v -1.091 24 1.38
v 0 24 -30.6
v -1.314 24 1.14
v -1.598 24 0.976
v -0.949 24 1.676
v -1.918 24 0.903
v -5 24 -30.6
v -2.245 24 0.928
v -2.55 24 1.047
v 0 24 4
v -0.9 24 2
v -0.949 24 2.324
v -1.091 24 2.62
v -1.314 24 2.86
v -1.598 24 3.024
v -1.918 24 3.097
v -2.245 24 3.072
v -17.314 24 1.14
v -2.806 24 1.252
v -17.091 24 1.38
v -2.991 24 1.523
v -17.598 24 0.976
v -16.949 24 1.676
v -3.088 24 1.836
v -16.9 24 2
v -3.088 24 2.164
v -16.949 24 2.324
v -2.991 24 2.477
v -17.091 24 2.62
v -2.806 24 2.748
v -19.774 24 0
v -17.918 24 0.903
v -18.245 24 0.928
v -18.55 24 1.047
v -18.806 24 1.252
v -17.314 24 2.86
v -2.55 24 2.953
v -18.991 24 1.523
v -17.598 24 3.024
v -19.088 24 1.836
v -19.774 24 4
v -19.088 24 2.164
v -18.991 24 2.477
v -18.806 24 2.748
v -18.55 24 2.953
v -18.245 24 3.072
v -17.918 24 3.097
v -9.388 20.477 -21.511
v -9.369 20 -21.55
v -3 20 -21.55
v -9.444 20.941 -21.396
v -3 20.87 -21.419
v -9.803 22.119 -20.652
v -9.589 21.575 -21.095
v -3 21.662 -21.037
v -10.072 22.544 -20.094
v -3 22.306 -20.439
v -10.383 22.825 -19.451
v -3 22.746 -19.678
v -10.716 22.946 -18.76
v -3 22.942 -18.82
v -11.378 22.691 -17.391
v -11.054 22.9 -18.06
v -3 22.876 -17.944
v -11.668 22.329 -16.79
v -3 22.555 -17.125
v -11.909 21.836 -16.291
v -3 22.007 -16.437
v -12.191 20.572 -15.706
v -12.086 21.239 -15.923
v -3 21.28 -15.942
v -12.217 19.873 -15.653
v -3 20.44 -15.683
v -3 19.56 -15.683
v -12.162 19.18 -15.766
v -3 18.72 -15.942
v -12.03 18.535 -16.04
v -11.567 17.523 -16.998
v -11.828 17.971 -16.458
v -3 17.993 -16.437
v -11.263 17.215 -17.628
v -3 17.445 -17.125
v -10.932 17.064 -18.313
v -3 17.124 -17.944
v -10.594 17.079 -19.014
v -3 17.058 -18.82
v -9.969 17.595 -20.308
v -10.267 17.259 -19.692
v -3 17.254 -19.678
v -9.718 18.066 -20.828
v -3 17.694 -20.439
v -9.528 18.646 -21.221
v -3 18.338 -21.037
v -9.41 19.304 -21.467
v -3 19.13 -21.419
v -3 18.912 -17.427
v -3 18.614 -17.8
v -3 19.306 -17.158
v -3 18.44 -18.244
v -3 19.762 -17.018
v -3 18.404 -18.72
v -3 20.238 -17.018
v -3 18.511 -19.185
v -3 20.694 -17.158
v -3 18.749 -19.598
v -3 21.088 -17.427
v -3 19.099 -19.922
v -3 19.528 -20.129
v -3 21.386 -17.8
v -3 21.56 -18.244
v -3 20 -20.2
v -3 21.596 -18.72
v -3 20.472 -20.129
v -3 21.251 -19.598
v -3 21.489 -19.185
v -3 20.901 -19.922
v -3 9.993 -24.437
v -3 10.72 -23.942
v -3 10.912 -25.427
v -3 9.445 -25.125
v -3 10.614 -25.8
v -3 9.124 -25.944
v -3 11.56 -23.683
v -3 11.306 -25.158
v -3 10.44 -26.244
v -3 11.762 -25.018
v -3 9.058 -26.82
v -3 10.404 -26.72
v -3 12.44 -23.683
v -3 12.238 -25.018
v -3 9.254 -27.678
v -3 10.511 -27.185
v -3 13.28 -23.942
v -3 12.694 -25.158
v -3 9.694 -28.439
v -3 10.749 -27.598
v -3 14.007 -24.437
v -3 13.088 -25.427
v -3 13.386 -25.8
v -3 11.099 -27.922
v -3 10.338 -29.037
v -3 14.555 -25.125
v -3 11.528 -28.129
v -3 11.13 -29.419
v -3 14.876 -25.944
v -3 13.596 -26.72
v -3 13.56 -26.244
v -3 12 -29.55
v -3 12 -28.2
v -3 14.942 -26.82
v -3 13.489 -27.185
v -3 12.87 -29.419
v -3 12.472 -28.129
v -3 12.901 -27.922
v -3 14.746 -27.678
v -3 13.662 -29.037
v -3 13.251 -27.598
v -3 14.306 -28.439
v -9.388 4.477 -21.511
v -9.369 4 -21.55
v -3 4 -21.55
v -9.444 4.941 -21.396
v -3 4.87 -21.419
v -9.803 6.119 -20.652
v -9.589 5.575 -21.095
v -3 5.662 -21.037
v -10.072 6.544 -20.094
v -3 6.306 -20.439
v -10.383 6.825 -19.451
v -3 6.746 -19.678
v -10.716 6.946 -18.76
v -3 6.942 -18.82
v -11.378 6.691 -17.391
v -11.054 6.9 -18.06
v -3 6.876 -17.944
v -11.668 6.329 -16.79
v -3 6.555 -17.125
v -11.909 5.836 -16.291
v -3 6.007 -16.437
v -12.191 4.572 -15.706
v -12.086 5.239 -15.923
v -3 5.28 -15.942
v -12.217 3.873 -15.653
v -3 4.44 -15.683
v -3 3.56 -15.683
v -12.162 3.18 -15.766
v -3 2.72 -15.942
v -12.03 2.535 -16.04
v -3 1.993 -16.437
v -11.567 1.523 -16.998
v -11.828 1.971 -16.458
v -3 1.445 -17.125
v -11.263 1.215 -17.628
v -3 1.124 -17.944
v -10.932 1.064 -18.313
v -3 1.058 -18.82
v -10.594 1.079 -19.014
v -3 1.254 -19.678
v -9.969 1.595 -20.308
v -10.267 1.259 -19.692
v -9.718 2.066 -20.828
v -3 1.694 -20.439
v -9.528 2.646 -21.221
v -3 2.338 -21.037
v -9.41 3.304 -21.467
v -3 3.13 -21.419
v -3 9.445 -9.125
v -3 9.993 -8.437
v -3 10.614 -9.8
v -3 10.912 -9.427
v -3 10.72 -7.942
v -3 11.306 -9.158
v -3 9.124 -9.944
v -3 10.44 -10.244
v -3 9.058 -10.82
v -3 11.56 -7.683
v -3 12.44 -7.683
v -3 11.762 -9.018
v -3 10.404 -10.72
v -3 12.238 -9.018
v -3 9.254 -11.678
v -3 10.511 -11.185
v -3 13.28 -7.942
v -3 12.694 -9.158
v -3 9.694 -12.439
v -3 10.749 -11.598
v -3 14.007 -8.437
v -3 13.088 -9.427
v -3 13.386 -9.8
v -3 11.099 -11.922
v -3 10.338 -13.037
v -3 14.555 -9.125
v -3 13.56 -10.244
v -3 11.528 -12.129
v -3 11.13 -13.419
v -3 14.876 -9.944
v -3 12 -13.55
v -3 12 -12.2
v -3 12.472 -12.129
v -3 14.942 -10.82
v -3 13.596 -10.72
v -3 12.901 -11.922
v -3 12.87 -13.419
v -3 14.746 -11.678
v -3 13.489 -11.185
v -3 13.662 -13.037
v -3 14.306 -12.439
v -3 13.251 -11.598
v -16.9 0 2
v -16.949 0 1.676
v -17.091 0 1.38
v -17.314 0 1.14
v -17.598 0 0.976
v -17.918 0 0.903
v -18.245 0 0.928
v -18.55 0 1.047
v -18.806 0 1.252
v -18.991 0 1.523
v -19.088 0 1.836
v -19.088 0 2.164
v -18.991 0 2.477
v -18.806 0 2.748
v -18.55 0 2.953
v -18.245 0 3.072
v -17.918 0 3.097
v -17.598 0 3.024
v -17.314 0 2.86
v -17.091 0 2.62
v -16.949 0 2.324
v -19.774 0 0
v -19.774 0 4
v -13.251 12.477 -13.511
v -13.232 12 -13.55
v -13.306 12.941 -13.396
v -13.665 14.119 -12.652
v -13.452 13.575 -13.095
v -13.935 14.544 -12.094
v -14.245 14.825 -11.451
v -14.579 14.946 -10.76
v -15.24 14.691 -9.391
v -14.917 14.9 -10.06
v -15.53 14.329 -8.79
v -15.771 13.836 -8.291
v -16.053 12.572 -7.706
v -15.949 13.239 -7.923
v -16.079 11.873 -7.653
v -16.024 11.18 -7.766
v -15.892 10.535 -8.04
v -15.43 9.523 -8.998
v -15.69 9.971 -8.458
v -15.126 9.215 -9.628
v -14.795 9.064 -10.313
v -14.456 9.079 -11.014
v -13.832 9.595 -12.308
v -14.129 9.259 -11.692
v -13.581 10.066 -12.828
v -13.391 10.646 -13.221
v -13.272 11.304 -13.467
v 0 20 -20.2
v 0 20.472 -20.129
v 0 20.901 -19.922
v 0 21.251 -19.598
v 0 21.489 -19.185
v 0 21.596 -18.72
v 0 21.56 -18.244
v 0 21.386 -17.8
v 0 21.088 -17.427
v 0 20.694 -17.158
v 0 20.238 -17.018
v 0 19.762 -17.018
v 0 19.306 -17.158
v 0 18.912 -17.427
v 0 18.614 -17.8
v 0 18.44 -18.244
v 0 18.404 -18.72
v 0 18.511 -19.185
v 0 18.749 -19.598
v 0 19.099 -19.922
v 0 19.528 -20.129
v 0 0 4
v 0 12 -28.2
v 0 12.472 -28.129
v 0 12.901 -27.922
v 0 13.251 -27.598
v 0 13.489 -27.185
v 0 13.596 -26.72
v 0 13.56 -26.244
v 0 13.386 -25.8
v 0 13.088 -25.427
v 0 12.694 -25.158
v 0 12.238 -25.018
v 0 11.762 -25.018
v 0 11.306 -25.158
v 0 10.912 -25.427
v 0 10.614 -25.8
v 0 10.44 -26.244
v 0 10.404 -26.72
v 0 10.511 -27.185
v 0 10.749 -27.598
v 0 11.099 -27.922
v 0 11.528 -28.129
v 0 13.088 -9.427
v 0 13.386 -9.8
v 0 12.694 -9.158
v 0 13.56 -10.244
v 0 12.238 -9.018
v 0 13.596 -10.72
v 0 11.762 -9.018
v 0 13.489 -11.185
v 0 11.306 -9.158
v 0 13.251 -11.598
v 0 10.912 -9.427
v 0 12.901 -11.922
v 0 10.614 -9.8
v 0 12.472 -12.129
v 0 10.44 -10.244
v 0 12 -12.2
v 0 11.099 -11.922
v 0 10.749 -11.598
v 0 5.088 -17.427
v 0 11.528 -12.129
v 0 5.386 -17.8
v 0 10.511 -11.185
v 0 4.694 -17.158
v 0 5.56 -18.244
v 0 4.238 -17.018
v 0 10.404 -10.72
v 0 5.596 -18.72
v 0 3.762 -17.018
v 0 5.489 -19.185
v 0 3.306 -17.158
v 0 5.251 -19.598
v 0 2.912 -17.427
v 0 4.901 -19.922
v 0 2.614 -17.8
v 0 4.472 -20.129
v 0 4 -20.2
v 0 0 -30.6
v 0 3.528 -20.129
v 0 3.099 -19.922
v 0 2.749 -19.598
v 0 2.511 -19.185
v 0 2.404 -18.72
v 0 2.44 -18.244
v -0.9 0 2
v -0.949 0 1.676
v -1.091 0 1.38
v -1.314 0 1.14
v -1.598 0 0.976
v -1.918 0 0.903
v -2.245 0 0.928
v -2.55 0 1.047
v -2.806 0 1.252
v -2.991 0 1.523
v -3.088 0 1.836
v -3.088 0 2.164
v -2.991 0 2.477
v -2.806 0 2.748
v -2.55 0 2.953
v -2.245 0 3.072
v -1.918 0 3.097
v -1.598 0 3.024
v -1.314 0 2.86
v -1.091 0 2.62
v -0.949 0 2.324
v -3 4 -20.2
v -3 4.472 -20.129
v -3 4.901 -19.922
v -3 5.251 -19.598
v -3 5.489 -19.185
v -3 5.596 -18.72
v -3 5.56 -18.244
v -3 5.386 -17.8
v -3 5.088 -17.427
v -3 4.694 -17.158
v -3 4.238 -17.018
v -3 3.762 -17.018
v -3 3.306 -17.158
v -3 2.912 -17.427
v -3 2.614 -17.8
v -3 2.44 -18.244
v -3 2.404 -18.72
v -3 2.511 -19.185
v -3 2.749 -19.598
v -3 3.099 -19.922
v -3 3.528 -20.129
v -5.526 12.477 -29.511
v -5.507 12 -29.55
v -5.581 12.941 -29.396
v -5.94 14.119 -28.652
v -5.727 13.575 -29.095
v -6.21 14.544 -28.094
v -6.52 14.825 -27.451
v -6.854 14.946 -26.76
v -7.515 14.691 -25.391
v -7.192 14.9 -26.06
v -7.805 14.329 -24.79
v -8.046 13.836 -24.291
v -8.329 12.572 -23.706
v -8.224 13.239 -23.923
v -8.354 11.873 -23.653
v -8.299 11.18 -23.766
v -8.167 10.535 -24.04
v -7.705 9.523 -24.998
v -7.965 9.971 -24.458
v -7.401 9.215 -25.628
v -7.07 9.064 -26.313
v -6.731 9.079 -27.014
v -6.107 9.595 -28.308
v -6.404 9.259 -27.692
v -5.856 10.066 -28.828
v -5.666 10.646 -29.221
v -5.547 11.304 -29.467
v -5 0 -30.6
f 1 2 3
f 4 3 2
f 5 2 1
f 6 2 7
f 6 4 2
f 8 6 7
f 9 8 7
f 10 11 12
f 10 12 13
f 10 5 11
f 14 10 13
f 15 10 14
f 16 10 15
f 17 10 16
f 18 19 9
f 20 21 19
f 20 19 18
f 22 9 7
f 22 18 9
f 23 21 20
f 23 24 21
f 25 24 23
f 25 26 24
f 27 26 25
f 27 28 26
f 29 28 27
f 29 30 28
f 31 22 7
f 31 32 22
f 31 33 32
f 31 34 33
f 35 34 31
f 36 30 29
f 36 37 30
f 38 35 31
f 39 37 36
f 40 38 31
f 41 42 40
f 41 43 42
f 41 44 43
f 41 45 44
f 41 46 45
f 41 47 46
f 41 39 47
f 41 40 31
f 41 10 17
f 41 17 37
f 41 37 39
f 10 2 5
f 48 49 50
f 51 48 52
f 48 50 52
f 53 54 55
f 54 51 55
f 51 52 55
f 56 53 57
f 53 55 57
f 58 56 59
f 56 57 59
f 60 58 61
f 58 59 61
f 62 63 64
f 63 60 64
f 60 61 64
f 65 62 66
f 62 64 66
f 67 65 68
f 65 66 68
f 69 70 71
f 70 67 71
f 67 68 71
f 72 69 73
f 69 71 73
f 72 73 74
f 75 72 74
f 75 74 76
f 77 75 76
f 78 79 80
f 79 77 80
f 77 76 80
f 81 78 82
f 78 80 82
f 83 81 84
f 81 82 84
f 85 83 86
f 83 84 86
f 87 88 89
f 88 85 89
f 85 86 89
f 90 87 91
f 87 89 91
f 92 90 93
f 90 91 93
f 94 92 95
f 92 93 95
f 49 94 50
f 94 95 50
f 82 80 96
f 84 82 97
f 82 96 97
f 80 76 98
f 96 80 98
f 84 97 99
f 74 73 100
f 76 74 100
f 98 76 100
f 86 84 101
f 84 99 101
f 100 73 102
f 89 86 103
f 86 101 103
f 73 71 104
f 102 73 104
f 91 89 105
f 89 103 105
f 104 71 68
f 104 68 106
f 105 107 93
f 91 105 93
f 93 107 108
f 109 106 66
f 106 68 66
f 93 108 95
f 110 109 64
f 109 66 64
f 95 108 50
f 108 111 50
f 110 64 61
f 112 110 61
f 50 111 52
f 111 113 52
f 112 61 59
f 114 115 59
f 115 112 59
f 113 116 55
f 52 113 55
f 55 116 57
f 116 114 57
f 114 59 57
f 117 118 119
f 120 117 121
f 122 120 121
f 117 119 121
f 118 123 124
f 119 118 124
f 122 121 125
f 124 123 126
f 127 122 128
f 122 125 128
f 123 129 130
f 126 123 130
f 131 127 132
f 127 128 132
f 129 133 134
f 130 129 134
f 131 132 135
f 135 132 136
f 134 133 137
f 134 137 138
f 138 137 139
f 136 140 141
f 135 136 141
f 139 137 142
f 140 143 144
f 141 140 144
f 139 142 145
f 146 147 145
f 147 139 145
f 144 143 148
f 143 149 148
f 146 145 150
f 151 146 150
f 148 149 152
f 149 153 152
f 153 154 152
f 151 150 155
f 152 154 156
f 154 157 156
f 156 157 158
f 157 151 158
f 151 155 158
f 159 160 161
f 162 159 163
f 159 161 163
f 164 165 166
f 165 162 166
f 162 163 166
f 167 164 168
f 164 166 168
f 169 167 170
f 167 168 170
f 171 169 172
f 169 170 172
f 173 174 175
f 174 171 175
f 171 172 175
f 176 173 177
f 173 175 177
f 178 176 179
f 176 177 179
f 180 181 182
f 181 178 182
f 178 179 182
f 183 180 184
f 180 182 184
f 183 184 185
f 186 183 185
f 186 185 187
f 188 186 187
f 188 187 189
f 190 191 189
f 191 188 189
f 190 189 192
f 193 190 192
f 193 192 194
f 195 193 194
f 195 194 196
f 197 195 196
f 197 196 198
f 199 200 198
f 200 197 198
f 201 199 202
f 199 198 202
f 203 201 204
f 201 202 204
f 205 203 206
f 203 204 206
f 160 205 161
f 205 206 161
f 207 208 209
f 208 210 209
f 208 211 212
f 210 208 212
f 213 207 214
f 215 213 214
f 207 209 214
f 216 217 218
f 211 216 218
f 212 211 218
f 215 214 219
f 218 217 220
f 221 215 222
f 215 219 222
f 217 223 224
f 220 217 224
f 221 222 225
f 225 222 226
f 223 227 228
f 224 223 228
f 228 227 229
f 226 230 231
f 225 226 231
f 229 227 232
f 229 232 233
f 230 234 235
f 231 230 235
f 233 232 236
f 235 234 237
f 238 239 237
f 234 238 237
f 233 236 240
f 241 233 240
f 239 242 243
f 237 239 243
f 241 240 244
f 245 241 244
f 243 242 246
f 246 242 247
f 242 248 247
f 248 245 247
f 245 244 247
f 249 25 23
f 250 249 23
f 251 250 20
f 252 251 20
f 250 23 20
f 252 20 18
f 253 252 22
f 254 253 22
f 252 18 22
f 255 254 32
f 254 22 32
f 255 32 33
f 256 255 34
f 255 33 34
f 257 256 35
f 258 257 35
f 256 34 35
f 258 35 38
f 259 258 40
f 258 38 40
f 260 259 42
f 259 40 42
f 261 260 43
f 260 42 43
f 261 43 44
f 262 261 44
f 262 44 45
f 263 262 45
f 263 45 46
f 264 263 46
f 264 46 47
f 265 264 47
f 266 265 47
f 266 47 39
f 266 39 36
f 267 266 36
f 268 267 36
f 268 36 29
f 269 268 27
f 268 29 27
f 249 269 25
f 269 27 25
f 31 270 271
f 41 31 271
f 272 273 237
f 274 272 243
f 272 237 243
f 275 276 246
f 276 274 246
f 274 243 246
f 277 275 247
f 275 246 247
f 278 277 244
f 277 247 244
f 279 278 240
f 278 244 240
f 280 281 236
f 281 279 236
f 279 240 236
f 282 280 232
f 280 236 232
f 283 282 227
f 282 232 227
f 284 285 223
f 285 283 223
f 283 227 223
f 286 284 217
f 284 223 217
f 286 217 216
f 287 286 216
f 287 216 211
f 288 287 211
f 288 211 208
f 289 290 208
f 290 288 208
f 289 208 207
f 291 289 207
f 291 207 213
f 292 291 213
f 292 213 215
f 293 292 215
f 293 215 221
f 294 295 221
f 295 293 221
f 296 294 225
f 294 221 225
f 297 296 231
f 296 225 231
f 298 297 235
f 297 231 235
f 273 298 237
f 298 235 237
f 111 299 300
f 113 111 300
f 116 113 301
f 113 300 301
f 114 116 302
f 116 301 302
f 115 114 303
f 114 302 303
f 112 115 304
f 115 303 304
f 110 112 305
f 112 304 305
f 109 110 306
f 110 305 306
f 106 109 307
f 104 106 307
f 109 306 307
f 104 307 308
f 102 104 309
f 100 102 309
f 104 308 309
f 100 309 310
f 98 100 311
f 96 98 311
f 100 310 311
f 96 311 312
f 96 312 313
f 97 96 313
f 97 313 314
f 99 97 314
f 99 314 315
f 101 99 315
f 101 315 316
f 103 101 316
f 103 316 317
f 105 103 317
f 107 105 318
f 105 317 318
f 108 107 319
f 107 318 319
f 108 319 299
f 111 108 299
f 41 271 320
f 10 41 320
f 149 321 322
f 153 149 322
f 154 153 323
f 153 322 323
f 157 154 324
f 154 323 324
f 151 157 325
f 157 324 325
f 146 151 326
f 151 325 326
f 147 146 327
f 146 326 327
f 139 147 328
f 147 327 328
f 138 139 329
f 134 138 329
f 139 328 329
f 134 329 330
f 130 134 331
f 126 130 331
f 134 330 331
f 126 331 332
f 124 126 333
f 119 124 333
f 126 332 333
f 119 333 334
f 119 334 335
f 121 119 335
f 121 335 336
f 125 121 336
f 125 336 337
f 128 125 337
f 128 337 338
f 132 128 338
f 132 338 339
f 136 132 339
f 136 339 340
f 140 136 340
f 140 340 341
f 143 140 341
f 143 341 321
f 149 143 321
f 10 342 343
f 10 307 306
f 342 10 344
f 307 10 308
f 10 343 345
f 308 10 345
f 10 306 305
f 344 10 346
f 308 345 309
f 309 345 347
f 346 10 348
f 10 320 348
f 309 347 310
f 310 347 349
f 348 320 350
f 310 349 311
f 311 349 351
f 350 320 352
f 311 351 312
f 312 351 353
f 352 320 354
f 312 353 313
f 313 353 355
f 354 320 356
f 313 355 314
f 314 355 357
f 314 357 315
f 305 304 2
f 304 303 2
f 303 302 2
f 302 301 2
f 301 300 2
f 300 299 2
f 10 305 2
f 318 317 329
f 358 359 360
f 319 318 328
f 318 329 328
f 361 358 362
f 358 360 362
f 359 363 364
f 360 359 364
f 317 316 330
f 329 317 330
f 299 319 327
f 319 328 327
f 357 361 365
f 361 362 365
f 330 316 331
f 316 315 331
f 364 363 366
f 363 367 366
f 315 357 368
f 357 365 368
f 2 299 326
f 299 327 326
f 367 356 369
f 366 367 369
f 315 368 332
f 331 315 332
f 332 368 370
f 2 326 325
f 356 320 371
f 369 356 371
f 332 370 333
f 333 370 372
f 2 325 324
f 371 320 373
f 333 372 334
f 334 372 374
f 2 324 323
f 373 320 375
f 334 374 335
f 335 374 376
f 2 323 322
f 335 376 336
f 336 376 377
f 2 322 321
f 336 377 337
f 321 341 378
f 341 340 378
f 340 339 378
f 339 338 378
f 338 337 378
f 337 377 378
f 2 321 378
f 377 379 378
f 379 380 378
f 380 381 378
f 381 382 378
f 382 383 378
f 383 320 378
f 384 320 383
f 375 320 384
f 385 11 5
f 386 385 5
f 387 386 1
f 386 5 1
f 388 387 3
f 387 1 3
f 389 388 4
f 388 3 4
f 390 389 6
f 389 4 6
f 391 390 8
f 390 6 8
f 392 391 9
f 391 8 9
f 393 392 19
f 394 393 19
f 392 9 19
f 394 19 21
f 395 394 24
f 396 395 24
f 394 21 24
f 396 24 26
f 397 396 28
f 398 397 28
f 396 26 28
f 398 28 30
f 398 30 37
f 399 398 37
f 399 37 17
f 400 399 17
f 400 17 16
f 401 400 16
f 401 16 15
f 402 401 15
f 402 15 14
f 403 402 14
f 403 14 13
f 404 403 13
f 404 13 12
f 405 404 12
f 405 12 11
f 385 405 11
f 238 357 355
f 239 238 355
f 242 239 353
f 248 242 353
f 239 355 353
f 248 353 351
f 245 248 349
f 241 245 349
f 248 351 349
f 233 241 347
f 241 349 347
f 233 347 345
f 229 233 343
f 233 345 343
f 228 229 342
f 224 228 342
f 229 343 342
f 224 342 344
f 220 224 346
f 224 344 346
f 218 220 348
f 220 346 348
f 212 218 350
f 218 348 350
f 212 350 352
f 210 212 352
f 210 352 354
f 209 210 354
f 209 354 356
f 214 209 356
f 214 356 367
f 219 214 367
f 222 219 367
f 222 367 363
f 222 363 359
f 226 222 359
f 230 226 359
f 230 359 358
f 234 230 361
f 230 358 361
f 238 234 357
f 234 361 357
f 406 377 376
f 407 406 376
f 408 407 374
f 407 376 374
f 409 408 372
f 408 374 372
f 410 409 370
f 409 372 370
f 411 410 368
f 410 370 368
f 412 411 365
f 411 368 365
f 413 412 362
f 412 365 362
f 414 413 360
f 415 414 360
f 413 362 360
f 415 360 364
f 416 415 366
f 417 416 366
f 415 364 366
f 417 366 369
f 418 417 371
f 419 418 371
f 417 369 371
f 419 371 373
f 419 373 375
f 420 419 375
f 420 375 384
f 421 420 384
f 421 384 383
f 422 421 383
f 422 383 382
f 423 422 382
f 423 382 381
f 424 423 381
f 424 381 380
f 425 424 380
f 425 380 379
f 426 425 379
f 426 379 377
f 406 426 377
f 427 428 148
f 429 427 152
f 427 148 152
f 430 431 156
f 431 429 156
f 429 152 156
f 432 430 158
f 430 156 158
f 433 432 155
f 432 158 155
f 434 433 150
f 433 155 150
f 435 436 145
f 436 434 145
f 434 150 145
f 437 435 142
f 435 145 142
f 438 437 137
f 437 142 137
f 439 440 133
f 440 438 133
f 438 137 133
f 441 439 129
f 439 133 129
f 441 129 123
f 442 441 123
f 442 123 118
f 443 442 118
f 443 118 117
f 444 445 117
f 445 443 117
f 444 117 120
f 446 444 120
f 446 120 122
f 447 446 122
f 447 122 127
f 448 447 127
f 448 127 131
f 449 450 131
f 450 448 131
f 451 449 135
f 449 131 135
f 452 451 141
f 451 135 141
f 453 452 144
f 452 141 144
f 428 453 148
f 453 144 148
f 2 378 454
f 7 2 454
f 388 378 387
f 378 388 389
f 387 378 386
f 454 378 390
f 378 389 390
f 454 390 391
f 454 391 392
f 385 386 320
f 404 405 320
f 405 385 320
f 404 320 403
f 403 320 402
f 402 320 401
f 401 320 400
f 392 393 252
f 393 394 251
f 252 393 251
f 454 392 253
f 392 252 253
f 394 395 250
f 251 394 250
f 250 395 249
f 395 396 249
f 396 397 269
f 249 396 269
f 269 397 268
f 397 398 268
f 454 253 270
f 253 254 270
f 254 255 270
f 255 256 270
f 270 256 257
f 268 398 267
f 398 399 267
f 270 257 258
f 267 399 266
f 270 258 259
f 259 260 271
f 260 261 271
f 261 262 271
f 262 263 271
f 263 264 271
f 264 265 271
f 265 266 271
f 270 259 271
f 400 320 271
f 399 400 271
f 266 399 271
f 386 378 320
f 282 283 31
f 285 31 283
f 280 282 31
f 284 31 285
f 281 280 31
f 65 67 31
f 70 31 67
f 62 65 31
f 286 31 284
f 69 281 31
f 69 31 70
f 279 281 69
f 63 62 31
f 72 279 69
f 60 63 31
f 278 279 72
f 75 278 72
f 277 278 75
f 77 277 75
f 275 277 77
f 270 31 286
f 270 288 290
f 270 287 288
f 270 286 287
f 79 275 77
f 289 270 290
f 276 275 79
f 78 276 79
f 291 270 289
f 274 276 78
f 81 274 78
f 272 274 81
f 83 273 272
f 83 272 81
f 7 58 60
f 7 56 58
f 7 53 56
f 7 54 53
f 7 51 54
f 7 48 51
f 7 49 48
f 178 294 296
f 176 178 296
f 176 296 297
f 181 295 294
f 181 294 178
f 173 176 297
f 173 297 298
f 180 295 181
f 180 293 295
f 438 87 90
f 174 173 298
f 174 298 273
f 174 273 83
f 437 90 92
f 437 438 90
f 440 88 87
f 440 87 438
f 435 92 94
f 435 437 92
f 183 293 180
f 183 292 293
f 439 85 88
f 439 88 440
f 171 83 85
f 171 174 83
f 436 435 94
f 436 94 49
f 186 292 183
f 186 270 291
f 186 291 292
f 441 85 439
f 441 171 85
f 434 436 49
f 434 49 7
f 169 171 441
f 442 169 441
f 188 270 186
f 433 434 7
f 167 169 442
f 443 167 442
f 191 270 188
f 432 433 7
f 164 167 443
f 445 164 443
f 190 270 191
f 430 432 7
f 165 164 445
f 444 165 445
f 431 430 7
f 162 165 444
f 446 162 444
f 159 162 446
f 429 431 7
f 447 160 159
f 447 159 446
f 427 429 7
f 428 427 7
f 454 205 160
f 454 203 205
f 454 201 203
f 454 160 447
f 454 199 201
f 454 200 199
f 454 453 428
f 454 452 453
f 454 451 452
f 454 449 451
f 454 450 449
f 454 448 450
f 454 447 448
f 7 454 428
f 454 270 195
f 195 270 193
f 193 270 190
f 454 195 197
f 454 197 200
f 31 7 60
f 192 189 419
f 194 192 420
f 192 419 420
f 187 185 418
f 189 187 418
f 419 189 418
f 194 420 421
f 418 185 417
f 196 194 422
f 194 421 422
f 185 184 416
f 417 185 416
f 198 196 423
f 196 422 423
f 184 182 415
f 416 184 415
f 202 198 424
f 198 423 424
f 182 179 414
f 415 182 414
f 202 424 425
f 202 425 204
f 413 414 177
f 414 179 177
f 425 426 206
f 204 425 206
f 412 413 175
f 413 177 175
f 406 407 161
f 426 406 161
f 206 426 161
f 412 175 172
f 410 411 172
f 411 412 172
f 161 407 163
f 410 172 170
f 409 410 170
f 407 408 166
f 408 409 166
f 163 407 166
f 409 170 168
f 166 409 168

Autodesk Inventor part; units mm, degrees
ref_plane "YZ Plane" through (0, 0, 0) normal (1, 0, 0) x (0, 1, 0)
ref_plane "XZ Plane" through (0, 0, 0) normal (0, 1, 0) x (-1, 0, 0)
sketch "Sketch1" plane through (0, 0, 0) normal (0, 1, 0) x (-1, 0, 0)
  line L0 (0, 0) -> (0, -30.6)
  line L1 (0, -30.6) -> (5, -30.6)
  line L2 (0, 0) -> (19.774, 0)
  line L3 (19.774, 0) -> (5, -30.6)
  line L4 (19.774, 0) -> (19.774, 4)
  line L5 (0, 0) -> (0, 9.5471)
  line L6 (19.774, 4) -> (-4.8744, 4)
  point P0 (0, 4)
  dimension "d0" = 30.6
  dimension "d1" = 5
  dimension "d2" = 19.774
  dimension "d3" = 4
extrude "Extrusion1" add sketch "Sketch1" along normal blind 24
sketch "Sketch2" plane through (0, 0, 4) normal (1, 0, 0) x (0, 0, -1)
  line L0 (34.6, 0) -> (34.6, 24) projected
  line L1 (34.6, 12) -> (30.6, 12)
  line L2 (30.6, 12) -> (14.6, 12)
  line L3 (22.6, 12) -> (22.6, 20)
  line L4 (22.6, 12) -> (22.6, 4)
  circle A0 centre (22.6, 20) radius 1.6
  circle A1 centre (14.6, 12) radius 1.6
  circle A2 centre (22.6, 4) radius 1.6
  circle A3 centre (30.6, 12) radius 1.6
  point P0 (4, 0)
  dimension "d6" = 4
  dimension "d7" = 16
  dimension "d8" = 8
  dimension "d9" = 8
  dimension "d10" = 3.2
  dimension "d11" = 3.2
  dimension "d12" = 3.2
  dimension "d13" = 3.2
extrude "Extrusion2" cut sketch "Sketch2" against normal blind 24
ref_plane "Work Plane1" through (-3, 0, 4) normal (1, 0, 0) x (0, 0, -1)
sketch "Sketch3" plane through (-3, 0, 4) normal (1, 0, 0) x (0, 0, -1)
  circle A0 centre (22.6, 20) radius 1.6 projected
  circle A1 centre (22.6, 20) radius 2.95
  circle A2 centre (14.6, 12) radius 1.6 projected
  circle A3 centre (14.6, 12) radius 2.95
  circle A4 centre (22.6, 4) radius 1.6 projected
  circle A5 centre (22.6, 4) radius 2.95
  circle A6 centre (30.6, 12) radius 1.6 projected
  circle A7 centre (30.6, 12) radius 2.95
  point P0 (4, 0)
  dimension "d17" = 5.9
  dimension "d18" = 5.9
  dimension "d19" = 5.9
  dimension "d20" = 5.9
extrude "Extrusion3" cut sketch "Sketch3" against normal blind 24 contours A0 | A1 | A2 | A3 | A4 | A5 | A6 | A7
sketch "Sketch4" plane through (0, 24, 0) normal (0, 1, 0) x (1, 0, 0)
  line L0 (0, -4) -> (0, 30.6) projected
  line L1 (0, -4) -> (-2, -4)
  line L2 (-2, -4) -> (-2, -2)
  line L3 (-2, -2) -> (0, -2)
  line L4 (0, -2) -> (0, -4)
  circle A0 centre (-2, -2) radius 1.1
  line L5 (-2, -2) -> (-18, -2)
  circle A1 centre (-18, -2) radius 1.1
  point P0 (0, 0)
  dimension "d23" = 2
  dimension "d24" = 2
  dimension "d25" = 2.2
  dimension "d26" = 16
  dimension "d27" = 2.2
extrude "Extrusion4" cut sketch "Sketch4" against normal blind 24 contours A1 | A0 L2 L3 | L3 L5 A0 | A0 L5 L2
properties part number "Finger_right_v5"
